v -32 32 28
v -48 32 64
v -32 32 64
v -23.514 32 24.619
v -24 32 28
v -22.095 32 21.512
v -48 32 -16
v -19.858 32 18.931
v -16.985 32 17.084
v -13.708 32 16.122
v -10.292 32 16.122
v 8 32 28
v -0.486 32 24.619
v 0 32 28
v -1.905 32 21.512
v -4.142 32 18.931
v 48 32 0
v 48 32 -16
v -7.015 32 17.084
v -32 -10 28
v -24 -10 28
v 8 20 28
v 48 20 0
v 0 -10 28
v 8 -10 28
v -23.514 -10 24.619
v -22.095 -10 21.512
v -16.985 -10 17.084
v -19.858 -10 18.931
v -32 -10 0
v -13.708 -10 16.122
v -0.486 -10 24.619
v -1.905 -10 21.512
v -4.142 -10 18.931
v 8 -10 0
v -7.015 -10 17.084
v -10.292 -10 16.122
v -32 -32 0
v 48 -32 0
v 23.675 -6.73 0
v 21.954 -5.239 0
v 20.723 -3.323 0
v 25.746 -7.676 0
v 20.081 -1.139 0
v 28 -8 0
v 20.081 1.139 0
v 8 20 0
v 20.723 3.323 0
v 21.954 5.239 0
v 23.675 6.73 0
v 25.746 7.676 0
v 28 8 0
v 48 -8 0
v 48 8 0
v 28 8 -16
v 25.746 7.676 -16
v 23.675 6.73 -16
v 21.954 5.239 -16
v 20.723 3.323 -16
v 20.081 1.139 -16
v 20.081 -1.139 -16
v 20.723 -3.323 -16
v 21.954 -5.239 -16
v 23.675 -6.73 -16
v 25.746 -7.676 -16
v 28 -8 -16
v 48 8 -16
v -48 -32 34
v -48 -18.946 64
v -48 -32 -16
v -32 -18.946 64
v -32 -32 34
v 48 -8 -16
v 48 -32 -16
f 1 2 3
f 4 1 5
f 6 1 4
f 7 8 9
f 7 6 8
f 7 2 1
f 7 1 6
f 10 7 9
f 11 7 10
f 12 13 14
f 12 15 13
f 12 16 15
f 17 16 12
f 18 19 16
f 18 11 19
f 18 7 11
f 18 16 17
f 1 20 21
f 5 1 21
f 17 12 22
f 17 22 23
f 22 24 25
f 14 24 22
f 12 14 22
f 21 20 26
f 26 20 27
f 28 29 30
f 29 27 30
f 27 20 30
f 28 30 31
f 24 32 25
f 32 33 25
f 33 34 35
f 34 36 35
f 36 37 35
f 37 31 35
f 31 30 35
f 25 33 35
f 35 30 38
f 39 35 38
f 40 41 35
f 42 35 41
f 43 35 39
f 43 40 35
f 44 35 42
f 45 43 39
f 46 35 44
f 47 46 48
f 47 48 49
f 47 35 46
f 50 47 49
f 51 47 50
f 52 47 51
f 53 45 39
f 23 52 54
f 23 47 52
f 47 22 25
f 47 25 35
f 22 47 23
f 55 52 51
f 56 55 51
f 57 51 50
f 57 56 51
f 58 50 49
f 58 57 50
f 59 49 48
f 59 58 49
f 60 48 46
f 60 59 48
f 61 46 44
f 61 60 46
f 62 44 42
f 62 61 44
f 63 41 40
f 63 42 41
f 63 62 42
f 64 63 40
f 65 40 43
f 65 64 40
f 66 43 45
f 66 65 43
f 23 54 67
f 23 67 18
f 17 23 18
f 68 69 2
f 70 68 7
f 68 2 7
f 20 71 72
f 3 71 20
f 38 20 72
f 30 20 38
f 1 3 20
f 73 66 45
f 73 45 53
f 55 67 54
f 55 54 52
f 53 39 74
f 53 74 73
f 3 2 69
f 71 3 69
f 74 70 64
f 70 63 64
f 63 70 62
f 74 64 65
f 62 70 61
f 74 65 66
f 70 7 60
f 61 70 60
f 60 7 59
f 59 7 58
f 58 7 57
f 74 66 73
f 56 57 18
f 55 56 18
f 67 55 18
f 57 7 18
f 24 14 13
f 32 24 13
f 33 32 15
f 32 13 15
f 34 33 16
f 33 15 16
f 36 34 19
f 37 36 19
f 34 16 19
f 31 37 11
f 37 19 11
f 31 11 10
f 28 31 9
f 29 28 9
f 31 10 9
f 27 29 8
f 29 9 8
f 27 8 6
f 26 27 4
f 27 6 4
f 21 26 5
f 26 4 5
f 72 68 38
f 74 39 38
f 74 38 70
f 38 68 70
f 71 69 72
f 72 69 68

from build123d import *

# Parameters (mm, degrees)
SKETCH1_W               = 96
SKETCH1_H               = 64
BOSS_EXTRUDE1_DEPTH     = 16
BOSS_EXTRUDE2_DEPTH     = 16
SKETCH3_W               = 40
SKETCH3_H               = 28
BOSS_EXTRUDE3_DEPTH     = 42
BOSS_EXTRUDE4_DEPTH     = 12
CUT_EXTRUDE1_DEPTH      = 87.162636914
CUT_EXTRUDE1_DEPTH_BACK = 87.162636914
SKETCH6_R               = 12
CUT_EXTRUDE2_DEPTH      = 103.449987799


with BuildPart() as part:
    # Sketch1 → Boss-Extrude1 (new body)
    with BuildSketch(Plane.XY):
        Rectangle(SKETCH1_W, SKETCH1_H)
    extrude(amount=-BOSS_EXTRUDE1_DEPTH)

    # Sketch2 → Boss-Extrude2 (add)
    with BuildSketch(Plane.ZY.offset(48)):
        Polygon((0, 32), (64, 32), (64, -18.946257373), (34, -32), (0, -32), align=None)
    extrude(amount=-BOSS_EXTRUDE2_DEPTH)

    # Sketch3 → Boss-Extrude3 (add)
    with BuildSketch(Plane(origin=(0, 32, 0), x_dir=(1, 0, 0), z_dir=(0, 1, 0))):
        with Locations((-12, -14)):
            Rectangle(SKETCH3_W, SKETCH3_H)
    extrude(amount=-BOSS_EXTRUDE3_DEPTH)

    # Sketch4 → Boss-Extrude4 (add)
    with BuildSketch(Plane(origin=(0, 32, 0), x_dir=(1, 0, 0), z_dir=(0, 1, 0))):
        Polygon((8, -28), (48, 0), (8, 0), align=None)
    extrude(amount=-BOSS_EXTRUDE4_DEPTH)

    # Sketch5 → Cut-Extrude1 (cut, two sides: drawn at the far end of the back side and taken through both)
    with BuildSketch(Plane.XY.offset(-CUT_EXTRUDE1_DEPTH_BACK)):
        with BuildLine():
            Line((48, -8), (48, 8))
            Line((48, 8), (28, 8))
            ThreePointArc((28, 8), (20, 0), (28, -8))
            Line((28, -8), (48, -8))
        make_face()
    extrude(amount=CUT_EXTRUDE1_DEPTH + CUT_EXTRUDE1_DEPTH_BACK, mode=Mode.SUBTRACT)

    # Sketch6 → Cut-Extrude2 (cut, through all)
    with BuildSketch(Plane(origin=(0, 32, 0), x_dir=(1, 0, 0), z_dir=(0, 1, 0))):
        with Locations((-12, -28)):
            Circle(SKETCH6_R)
    extrude(amount=-CUT_EXTRUDE2_DEPTH, mode=Mode.SUBTRACT)


solid = part.part
